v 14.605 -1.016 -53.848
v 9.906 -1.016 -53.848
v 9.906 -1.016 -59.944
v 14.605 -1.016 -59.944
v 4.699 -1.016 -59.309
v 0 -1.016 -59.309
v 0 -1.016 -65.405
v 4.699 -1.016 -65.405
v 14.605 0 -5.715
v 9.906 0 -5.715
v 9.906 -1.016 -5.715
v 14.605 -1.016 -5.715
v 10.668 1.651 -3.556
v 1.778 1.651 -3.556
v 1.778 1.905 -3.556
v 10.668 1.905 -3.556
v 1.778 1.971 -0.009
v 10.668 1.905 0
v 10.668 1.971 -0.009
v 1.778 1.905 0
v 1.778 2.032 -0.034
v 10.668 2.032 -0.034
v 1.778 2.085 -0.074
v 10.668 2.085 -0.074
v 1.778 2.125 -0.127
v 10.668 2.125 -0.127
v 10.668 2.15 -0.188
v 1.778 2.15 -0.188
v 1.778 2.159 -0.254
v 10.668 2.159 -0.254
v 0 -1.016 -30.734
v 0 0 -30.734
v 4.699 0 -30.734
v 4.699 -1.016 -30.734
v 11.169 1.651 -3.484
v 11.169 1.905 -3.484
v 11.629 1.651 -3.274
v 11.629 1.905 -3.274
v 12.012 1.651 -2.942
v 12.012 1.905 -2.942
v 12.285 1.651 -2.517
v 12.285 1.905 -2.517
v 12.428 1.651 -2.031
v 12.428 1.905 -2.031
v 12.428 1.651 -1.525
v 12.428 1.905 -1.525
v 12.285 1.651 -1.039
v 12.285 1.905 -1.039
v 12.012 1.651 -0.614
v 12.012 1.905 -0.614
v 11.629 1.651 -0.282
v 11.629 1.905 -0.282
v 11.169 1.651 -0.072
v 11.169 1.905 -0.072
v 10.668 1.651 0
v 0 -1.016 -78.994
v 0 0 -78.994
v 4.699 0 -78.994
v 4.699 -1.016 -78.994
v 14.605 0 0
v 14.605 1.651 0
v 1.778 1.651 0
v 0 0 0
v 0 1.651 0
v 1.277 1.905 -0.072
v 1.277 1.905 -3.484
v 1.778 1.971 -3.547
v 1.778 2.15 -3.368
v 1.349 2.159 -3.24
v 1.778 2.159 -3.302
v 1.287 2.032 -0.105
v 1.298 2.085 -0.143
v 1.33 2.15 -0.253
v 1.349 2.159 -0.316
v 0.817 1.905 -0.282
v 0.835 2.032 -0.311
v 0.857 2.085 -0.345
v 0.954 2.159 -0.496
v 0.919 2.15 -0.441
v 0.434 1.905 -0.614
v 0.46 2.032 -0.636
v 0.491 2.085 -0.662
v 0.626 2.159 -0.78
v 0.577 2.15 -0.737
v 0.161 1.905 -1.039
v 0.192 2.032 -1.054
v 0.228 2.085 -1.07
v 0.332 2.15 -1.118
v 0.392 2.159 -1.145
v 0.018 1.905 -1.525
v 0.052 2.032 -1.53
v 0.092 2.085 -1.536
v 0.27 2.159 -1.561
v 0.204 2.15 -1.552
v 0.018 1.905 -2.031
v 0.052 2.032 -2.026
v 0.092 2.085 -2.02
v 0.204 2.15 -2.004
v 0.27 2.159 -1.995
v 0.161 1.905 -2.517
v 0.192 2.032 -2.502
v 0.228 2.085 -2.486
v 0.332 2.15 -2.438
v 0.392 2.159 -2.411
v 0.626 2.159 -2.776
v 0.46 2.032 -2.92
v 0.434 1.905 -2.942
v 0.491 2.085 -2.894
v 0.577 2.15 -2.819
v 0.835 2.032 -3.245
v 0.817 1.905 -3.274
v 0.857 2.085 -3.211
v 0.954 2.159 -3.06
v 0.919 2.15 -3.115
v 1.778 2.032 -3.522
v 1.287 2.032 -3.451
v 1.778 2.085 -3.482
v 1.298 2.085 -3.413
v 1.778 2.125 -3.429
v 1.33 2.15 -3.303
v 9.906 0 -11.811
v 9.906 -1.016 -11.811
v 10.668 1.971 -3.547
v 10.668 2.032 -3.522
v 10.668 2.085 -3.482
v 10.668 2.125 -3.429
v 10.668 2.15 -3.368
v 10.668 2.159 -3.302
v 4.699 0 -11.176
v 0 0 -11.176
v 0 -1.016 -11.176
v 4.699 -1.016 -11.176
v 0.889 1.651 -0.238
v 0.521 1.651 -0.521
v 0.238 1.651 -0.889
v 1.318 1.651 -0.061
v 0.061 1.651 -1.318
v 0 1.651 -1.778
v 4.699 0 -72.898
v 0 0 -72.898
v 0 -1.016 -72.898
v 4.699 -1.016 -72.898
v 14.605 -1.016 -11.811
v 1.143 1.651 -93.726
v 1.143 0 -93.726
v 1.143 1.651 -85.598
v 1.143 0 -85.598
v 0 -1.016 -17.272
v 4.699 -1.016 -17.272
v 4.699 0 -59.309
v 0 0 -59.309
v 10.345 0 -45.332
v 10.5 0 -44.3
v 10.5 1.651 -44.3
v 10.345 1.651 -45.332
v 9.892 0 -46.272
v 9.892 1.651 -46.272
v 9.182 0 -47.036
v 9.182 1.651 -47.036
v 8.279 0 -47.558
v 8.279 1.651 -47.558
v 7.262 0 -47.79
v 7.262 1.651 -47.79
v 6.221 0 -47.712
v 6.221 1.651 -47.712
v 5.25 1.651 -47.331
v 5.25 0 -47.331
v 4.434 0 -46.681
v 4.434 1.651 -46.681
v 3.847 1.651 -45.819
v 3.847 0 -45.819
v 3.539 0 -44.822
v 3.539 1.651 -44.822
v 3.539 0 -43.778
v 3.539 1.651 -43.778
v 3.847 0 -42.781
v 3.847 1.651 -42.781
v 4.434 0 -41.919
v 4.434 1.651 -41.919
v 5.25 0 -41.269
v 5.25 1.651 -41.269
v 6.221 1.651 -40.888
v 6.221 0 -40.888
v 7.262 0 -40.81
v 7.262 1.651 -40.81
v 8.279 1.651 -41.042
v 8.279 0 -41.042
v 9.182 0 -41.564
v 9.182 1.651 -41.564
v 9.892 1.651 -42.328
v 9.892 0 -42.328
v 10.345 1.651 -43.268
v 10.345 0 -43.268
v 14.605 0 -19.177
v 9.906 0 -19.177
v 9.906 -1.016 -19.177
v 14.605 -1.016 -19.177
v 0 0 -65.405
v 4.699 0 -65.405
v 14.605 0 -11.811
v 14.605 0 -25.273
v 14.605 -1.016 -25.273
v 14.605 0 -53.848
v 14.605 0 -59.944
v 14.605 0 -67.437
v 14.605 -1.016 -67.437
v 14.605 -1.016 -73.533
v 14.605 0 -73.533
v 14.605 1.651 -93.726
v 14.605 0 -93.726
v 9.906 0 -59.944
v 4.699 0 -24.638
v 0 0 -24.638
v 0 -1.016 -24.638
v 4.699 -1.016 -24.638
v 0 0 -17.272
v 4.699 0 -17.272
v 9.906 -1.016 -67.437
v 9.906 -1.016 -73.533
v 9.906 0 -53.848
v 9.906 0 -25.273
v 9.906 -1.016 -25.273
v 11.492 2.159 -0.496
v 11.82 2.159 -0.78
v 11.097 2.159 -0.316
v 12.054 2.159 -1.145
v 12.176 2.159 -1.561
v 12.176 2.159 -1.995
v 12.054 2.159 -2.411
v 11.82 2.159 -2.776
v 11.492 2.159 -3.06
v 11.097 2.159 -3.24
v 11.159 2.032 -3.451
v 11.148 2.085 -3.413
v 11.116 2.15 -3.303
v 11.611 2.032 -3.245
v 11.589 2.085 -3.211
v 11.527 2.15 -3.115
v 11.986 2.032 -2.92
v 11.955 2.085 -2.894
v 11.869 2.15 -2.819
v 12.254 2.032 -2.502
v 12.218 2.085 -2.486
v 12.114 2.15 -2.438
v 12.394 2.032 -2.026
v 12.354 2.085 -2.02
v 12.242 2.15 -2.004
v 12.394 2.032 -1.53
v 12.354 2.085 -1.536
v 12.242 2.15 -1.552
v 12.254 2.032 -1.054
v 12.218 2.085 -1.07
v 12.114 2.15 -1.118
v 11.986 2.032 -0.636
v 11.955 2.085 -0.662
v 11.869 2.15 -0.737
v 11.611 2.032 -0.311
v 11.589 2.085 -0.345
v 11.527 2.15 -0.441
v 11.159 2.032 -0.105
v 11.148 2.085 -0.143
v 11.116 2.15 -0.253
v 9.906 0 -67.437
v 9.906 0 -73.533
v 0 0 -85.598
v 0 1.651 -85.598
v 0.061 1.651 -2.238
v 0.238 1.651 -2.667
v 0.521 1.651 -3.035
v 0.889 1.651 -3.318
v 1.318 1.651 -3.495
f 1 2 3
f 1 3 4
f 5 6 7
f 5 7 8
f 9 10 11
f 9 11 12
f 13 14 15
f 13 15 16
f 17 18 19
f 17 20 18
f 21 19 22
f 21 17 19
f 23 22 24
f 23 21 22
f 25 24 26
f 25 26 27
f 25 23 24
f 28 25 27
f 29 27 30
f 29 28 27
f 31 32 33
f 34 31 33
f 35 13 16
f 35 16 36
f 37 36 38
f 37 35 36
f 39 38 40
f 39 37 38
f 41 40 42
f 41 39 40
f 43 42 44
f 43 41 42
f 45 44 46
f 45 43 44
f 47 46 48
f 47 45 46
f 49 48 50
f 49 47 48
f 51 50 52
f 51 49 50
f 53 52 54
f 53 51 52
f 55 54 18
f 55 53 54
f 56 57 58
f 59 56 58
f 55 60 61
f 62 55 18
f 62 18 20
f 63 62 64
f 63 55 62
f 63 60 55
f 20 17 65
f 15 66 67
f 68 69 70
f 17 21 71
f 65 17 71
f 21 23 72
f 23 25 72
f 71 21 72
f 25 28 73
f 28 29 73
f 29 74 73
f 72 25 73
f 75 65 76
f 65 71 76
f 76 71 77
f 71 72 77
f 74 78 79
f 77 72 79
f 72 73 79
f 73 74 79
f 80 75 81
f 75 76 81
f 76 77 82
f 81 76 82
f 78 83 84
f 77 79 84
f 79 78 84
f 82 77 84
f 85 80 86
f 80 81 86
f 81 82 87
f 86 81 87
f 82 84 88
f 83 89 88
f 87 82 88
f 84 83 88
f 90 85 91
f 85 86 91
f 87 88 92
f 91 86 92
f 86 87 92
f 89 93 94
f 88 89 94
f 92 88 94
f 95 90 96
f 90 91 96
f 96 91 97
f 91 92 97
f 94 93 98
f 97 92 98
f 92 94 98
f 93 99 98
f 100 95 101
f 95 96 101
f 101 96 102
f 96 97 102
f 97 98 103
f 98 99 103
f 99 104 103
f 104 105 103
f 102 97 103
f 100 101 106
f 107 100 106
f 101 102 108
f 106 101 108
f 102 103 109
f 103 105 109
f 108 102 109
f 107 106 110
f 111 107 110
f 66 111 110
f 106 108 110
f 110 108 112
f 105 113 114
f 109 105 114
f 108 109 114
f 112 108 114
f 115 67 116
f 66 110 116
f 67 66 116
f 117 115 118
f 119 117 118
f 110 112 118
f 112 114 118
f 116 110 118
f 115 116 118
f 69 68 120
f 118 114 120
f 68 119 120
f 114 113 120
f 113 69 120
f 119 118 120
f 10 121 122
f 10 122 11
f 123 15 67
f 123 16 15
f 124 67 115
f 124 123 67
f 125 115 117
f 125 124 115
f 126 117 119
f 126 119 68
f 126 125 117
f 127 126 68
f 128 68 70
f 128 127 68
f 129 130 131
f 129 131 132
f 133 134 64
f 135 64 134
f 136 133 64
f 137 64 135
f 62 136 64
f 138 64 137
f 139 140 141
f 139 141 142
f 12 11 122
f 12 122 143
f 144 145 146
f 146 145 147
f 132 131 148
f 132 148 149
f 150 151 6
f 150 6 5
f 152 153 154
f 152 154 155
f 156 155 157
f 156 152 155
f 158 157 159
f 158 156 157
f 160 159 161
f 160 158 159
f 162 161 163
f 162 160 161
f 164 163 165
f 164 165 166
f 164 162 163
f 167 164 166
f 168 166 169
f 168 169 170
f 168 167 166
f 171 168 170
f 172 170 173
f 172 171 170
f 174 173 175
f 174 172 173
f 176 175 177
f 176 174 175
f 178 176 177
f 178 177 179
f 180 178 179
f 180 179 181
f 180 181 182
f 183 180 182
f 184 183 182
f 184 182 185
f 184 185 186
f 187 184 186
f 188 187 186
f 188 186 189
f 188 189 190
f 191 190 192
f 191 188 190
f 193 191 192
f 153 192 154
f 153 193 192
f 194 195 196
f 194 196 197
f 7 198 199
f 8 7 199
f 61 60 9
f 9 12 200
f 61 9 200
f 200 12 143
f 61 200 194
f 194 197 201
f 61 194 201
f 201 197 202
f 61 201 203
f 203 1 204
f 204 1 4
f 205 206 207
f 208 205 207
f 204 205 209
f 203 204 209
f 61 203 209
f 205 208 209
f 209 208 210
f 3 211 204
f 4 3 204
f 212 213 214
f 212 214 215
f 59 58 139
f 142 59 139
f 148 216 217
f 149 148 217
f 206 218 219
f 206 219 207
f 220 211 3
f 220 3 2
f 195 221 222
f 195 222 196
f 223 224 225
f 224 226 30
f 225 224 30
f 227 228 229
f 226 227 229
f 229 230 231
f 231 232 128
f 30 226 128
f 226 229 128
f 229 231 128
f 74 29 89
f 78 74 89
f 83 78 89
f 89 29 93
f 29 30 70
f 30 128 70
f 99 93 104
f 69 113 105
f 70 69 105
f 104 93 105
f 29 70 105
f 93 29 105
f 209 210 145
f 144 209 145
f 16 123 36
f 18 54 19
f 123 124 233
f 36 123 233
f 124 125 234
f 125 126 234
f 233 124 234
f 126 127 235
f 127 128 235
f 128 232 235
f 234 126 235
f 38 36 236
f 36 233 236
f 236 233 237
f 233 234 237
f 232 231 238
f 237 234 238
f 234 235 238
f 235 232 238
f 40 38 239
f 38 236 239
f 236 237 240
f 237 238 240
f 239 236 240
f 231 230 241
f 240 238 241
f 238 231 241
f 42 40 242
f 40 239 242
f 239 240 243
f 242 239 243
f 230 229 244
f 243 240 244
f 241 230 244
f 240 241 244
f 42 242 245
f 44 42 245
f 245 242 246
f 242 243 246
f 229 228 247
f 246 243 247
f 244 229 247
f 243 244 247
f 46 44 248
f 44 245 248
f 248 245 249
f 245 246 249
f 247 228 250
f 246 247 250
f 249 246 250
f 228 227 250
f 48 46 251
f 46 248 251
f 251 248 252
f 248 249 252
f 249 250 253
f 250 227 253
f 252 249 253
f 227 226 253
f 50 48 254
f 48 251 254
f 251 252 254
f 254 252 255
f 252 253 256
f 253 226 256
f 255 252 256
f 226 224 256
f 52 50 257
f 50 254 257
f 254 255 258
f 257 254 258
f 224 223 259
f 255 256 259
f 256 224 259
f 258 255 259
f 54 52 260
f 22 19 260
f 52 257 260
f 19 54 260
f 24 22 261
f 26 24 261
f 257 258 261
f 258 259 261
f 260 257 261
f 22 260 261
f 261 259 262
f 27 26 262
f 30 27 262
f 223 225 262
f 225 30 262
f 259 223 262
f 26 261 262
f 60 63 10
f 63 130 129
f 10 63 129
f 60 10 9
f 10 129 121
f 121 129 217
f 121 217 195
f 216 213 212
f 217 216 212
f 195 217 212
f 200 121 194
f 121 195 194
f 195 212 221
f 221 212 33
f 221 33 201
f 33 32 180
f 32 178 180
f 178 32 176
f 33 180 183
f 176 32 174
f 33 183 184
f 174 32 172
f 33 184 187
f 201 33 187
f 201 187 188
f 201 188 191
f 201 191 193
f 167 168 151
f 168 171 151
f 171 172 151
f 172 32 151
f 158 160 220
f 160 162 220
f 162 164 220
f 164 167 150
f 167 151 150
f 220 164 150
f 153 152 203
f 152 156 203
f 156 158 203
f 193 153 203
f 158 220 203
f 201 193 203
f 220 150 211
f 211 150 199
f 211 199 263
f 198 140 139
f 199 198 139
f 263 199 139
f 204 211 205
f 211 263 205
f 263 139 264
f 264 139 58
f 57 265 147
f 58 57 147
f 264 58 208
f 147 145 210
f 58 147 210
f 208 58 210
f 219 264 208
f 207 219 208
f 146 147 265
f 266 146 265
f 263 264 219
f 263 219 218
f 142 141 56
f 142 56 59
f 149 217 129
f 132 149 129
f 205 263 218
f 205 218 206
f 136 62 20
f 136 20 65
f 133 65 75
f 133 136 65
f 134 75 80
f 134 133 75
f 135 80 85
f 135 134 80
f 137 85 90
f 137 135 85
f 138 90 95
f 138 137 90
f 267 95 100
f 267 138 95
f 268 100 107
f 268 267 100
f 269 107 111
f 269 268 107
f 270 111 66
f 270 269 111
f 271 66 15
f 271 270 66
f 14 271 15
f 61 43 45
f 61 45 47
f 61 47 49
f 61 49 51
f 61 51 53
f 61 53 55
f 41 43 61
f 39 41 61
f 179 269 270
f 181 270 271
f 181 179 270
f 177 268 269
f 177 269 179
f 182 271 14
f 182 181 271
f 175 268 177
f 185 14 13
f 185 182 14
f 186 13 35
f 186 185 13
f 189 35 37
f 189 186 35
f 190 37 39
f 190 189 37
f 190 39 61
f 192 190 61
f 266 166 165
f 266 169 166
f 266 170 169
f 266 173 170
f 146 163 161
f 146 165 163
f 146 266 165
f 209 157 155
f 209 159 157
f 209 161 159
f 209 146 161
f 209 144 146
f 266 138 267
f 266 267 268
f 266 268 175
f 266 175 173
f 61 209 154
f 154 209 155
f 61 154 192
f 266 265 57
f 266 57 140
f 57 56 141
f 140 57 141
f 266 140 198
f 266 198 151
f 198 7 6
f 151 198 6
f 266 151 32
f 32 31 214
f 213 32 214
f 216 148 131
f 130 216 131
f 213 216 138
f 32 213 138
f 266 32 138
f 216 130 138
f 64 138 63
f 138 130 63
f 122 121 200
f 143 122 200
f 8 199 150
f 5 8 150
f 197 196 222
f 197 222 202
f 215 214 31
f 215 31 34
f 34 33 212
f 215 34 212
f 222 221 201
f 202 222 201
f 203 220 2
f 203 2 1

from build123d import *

# Parameters (mm, degrees)
SKETCH1_R           = 3.5
BOSS_EXTRUDE1_DEPTH = 1.651
BOSS_EXTRUDE2_DEPTH = 0.508
FILLET1_R           = 0.254
SKETCH3_W           = 4.699
SKETCH3_H           = 6.096
BOSS_EXTRUDE3_DEPTH = 1.016


with BuildPart() as part:
    # Sketch1 → Boss-Extrude1 (new body)
    with BuildSketch(Plane(origin=(0, 0, 0), x_dir=(1, 0, 0), z_dir=(0, 1, 0))):
        Polygon((0, 85.598), (0, 0), (14.605, 0), (14.605, 93.726), (1.143, 93.726), (1.143, 85.598), align=None)
        with Locations((7, 44.3)):
            Circle(SKETCH1_R, mode=Mode.SUBTRACT)
    extrude(amount=BOSS_EXTRUDE1_DEPTH)

    # Sketch2 → Boss-Extrude2 (add)
    with BuildSketch(Plane(origin=(0, 1.651, 0), x_dir=(1, 0, 0), z_dir=(0, 1, 0))):
        with BuildLine():
            Line((1.778, 3.556), (10.668, 3.556))
            ThreePointArc((10.668, 3.556), (12.446, 1.778), (10.668, 0))
            Line((10.668, 0), (1.778, 0))
            ThreePointArc((1.778, 0), (0, 1.778), (1.778, 3.556))
        make_face()
    extrude(amount=BOSS_EXTRUDE2_DEPTH)

    # Fillet1
    fillet1_edges = [part.edges().sort_by_distance(p)[0] for p in [
        (6.223, 2.159, -3.556),
        (6.223, 2.159, 0),
        (12.446, 2.159, -1.778),
        (0, 2.159, -1.778),
    ]]
    fillet(fillet1_edges, radius=FILLET1_R)

    # Sketch3 → Boss-Extrude3 (add)
    with BuildSketch(Plane.XZ):
        with Locations((12.2555, -8.763)):
            Rectangle(SKETCH3_W, SKETCH3_H)
        with Locations((12.2555, -22.225)):
            Rectangle(SKETCH3_W, SKETCH3_H)
        with Locations((12.2555, -56.896)):
            Rectangle(SKETCH3_W, SKETCH3_H)
        with Locations((12.2555, -70.485)):
            Rectangle(SKETCH3_W, SKETCH3_H)
        with Locations((2.3495, -75.946)):
            Rectangle(SKETCH3_W, SKETCH3_H)
        with Locations((2.3495, -62.357)):
            Rectangle(SKETCH3_W, SKETCH3_H)
        with Locations((2.3495, -27.686)):
            Rectangle(SKETCH3_W, SKETCH3_H)
        with Locations((2.3495, -14.224)):
            Rectangle(SKETCH3_W, SKETCH3_H)
    extrude(amount=BOSS_EXTRUDE3_DEPTH)


solid = part.part
